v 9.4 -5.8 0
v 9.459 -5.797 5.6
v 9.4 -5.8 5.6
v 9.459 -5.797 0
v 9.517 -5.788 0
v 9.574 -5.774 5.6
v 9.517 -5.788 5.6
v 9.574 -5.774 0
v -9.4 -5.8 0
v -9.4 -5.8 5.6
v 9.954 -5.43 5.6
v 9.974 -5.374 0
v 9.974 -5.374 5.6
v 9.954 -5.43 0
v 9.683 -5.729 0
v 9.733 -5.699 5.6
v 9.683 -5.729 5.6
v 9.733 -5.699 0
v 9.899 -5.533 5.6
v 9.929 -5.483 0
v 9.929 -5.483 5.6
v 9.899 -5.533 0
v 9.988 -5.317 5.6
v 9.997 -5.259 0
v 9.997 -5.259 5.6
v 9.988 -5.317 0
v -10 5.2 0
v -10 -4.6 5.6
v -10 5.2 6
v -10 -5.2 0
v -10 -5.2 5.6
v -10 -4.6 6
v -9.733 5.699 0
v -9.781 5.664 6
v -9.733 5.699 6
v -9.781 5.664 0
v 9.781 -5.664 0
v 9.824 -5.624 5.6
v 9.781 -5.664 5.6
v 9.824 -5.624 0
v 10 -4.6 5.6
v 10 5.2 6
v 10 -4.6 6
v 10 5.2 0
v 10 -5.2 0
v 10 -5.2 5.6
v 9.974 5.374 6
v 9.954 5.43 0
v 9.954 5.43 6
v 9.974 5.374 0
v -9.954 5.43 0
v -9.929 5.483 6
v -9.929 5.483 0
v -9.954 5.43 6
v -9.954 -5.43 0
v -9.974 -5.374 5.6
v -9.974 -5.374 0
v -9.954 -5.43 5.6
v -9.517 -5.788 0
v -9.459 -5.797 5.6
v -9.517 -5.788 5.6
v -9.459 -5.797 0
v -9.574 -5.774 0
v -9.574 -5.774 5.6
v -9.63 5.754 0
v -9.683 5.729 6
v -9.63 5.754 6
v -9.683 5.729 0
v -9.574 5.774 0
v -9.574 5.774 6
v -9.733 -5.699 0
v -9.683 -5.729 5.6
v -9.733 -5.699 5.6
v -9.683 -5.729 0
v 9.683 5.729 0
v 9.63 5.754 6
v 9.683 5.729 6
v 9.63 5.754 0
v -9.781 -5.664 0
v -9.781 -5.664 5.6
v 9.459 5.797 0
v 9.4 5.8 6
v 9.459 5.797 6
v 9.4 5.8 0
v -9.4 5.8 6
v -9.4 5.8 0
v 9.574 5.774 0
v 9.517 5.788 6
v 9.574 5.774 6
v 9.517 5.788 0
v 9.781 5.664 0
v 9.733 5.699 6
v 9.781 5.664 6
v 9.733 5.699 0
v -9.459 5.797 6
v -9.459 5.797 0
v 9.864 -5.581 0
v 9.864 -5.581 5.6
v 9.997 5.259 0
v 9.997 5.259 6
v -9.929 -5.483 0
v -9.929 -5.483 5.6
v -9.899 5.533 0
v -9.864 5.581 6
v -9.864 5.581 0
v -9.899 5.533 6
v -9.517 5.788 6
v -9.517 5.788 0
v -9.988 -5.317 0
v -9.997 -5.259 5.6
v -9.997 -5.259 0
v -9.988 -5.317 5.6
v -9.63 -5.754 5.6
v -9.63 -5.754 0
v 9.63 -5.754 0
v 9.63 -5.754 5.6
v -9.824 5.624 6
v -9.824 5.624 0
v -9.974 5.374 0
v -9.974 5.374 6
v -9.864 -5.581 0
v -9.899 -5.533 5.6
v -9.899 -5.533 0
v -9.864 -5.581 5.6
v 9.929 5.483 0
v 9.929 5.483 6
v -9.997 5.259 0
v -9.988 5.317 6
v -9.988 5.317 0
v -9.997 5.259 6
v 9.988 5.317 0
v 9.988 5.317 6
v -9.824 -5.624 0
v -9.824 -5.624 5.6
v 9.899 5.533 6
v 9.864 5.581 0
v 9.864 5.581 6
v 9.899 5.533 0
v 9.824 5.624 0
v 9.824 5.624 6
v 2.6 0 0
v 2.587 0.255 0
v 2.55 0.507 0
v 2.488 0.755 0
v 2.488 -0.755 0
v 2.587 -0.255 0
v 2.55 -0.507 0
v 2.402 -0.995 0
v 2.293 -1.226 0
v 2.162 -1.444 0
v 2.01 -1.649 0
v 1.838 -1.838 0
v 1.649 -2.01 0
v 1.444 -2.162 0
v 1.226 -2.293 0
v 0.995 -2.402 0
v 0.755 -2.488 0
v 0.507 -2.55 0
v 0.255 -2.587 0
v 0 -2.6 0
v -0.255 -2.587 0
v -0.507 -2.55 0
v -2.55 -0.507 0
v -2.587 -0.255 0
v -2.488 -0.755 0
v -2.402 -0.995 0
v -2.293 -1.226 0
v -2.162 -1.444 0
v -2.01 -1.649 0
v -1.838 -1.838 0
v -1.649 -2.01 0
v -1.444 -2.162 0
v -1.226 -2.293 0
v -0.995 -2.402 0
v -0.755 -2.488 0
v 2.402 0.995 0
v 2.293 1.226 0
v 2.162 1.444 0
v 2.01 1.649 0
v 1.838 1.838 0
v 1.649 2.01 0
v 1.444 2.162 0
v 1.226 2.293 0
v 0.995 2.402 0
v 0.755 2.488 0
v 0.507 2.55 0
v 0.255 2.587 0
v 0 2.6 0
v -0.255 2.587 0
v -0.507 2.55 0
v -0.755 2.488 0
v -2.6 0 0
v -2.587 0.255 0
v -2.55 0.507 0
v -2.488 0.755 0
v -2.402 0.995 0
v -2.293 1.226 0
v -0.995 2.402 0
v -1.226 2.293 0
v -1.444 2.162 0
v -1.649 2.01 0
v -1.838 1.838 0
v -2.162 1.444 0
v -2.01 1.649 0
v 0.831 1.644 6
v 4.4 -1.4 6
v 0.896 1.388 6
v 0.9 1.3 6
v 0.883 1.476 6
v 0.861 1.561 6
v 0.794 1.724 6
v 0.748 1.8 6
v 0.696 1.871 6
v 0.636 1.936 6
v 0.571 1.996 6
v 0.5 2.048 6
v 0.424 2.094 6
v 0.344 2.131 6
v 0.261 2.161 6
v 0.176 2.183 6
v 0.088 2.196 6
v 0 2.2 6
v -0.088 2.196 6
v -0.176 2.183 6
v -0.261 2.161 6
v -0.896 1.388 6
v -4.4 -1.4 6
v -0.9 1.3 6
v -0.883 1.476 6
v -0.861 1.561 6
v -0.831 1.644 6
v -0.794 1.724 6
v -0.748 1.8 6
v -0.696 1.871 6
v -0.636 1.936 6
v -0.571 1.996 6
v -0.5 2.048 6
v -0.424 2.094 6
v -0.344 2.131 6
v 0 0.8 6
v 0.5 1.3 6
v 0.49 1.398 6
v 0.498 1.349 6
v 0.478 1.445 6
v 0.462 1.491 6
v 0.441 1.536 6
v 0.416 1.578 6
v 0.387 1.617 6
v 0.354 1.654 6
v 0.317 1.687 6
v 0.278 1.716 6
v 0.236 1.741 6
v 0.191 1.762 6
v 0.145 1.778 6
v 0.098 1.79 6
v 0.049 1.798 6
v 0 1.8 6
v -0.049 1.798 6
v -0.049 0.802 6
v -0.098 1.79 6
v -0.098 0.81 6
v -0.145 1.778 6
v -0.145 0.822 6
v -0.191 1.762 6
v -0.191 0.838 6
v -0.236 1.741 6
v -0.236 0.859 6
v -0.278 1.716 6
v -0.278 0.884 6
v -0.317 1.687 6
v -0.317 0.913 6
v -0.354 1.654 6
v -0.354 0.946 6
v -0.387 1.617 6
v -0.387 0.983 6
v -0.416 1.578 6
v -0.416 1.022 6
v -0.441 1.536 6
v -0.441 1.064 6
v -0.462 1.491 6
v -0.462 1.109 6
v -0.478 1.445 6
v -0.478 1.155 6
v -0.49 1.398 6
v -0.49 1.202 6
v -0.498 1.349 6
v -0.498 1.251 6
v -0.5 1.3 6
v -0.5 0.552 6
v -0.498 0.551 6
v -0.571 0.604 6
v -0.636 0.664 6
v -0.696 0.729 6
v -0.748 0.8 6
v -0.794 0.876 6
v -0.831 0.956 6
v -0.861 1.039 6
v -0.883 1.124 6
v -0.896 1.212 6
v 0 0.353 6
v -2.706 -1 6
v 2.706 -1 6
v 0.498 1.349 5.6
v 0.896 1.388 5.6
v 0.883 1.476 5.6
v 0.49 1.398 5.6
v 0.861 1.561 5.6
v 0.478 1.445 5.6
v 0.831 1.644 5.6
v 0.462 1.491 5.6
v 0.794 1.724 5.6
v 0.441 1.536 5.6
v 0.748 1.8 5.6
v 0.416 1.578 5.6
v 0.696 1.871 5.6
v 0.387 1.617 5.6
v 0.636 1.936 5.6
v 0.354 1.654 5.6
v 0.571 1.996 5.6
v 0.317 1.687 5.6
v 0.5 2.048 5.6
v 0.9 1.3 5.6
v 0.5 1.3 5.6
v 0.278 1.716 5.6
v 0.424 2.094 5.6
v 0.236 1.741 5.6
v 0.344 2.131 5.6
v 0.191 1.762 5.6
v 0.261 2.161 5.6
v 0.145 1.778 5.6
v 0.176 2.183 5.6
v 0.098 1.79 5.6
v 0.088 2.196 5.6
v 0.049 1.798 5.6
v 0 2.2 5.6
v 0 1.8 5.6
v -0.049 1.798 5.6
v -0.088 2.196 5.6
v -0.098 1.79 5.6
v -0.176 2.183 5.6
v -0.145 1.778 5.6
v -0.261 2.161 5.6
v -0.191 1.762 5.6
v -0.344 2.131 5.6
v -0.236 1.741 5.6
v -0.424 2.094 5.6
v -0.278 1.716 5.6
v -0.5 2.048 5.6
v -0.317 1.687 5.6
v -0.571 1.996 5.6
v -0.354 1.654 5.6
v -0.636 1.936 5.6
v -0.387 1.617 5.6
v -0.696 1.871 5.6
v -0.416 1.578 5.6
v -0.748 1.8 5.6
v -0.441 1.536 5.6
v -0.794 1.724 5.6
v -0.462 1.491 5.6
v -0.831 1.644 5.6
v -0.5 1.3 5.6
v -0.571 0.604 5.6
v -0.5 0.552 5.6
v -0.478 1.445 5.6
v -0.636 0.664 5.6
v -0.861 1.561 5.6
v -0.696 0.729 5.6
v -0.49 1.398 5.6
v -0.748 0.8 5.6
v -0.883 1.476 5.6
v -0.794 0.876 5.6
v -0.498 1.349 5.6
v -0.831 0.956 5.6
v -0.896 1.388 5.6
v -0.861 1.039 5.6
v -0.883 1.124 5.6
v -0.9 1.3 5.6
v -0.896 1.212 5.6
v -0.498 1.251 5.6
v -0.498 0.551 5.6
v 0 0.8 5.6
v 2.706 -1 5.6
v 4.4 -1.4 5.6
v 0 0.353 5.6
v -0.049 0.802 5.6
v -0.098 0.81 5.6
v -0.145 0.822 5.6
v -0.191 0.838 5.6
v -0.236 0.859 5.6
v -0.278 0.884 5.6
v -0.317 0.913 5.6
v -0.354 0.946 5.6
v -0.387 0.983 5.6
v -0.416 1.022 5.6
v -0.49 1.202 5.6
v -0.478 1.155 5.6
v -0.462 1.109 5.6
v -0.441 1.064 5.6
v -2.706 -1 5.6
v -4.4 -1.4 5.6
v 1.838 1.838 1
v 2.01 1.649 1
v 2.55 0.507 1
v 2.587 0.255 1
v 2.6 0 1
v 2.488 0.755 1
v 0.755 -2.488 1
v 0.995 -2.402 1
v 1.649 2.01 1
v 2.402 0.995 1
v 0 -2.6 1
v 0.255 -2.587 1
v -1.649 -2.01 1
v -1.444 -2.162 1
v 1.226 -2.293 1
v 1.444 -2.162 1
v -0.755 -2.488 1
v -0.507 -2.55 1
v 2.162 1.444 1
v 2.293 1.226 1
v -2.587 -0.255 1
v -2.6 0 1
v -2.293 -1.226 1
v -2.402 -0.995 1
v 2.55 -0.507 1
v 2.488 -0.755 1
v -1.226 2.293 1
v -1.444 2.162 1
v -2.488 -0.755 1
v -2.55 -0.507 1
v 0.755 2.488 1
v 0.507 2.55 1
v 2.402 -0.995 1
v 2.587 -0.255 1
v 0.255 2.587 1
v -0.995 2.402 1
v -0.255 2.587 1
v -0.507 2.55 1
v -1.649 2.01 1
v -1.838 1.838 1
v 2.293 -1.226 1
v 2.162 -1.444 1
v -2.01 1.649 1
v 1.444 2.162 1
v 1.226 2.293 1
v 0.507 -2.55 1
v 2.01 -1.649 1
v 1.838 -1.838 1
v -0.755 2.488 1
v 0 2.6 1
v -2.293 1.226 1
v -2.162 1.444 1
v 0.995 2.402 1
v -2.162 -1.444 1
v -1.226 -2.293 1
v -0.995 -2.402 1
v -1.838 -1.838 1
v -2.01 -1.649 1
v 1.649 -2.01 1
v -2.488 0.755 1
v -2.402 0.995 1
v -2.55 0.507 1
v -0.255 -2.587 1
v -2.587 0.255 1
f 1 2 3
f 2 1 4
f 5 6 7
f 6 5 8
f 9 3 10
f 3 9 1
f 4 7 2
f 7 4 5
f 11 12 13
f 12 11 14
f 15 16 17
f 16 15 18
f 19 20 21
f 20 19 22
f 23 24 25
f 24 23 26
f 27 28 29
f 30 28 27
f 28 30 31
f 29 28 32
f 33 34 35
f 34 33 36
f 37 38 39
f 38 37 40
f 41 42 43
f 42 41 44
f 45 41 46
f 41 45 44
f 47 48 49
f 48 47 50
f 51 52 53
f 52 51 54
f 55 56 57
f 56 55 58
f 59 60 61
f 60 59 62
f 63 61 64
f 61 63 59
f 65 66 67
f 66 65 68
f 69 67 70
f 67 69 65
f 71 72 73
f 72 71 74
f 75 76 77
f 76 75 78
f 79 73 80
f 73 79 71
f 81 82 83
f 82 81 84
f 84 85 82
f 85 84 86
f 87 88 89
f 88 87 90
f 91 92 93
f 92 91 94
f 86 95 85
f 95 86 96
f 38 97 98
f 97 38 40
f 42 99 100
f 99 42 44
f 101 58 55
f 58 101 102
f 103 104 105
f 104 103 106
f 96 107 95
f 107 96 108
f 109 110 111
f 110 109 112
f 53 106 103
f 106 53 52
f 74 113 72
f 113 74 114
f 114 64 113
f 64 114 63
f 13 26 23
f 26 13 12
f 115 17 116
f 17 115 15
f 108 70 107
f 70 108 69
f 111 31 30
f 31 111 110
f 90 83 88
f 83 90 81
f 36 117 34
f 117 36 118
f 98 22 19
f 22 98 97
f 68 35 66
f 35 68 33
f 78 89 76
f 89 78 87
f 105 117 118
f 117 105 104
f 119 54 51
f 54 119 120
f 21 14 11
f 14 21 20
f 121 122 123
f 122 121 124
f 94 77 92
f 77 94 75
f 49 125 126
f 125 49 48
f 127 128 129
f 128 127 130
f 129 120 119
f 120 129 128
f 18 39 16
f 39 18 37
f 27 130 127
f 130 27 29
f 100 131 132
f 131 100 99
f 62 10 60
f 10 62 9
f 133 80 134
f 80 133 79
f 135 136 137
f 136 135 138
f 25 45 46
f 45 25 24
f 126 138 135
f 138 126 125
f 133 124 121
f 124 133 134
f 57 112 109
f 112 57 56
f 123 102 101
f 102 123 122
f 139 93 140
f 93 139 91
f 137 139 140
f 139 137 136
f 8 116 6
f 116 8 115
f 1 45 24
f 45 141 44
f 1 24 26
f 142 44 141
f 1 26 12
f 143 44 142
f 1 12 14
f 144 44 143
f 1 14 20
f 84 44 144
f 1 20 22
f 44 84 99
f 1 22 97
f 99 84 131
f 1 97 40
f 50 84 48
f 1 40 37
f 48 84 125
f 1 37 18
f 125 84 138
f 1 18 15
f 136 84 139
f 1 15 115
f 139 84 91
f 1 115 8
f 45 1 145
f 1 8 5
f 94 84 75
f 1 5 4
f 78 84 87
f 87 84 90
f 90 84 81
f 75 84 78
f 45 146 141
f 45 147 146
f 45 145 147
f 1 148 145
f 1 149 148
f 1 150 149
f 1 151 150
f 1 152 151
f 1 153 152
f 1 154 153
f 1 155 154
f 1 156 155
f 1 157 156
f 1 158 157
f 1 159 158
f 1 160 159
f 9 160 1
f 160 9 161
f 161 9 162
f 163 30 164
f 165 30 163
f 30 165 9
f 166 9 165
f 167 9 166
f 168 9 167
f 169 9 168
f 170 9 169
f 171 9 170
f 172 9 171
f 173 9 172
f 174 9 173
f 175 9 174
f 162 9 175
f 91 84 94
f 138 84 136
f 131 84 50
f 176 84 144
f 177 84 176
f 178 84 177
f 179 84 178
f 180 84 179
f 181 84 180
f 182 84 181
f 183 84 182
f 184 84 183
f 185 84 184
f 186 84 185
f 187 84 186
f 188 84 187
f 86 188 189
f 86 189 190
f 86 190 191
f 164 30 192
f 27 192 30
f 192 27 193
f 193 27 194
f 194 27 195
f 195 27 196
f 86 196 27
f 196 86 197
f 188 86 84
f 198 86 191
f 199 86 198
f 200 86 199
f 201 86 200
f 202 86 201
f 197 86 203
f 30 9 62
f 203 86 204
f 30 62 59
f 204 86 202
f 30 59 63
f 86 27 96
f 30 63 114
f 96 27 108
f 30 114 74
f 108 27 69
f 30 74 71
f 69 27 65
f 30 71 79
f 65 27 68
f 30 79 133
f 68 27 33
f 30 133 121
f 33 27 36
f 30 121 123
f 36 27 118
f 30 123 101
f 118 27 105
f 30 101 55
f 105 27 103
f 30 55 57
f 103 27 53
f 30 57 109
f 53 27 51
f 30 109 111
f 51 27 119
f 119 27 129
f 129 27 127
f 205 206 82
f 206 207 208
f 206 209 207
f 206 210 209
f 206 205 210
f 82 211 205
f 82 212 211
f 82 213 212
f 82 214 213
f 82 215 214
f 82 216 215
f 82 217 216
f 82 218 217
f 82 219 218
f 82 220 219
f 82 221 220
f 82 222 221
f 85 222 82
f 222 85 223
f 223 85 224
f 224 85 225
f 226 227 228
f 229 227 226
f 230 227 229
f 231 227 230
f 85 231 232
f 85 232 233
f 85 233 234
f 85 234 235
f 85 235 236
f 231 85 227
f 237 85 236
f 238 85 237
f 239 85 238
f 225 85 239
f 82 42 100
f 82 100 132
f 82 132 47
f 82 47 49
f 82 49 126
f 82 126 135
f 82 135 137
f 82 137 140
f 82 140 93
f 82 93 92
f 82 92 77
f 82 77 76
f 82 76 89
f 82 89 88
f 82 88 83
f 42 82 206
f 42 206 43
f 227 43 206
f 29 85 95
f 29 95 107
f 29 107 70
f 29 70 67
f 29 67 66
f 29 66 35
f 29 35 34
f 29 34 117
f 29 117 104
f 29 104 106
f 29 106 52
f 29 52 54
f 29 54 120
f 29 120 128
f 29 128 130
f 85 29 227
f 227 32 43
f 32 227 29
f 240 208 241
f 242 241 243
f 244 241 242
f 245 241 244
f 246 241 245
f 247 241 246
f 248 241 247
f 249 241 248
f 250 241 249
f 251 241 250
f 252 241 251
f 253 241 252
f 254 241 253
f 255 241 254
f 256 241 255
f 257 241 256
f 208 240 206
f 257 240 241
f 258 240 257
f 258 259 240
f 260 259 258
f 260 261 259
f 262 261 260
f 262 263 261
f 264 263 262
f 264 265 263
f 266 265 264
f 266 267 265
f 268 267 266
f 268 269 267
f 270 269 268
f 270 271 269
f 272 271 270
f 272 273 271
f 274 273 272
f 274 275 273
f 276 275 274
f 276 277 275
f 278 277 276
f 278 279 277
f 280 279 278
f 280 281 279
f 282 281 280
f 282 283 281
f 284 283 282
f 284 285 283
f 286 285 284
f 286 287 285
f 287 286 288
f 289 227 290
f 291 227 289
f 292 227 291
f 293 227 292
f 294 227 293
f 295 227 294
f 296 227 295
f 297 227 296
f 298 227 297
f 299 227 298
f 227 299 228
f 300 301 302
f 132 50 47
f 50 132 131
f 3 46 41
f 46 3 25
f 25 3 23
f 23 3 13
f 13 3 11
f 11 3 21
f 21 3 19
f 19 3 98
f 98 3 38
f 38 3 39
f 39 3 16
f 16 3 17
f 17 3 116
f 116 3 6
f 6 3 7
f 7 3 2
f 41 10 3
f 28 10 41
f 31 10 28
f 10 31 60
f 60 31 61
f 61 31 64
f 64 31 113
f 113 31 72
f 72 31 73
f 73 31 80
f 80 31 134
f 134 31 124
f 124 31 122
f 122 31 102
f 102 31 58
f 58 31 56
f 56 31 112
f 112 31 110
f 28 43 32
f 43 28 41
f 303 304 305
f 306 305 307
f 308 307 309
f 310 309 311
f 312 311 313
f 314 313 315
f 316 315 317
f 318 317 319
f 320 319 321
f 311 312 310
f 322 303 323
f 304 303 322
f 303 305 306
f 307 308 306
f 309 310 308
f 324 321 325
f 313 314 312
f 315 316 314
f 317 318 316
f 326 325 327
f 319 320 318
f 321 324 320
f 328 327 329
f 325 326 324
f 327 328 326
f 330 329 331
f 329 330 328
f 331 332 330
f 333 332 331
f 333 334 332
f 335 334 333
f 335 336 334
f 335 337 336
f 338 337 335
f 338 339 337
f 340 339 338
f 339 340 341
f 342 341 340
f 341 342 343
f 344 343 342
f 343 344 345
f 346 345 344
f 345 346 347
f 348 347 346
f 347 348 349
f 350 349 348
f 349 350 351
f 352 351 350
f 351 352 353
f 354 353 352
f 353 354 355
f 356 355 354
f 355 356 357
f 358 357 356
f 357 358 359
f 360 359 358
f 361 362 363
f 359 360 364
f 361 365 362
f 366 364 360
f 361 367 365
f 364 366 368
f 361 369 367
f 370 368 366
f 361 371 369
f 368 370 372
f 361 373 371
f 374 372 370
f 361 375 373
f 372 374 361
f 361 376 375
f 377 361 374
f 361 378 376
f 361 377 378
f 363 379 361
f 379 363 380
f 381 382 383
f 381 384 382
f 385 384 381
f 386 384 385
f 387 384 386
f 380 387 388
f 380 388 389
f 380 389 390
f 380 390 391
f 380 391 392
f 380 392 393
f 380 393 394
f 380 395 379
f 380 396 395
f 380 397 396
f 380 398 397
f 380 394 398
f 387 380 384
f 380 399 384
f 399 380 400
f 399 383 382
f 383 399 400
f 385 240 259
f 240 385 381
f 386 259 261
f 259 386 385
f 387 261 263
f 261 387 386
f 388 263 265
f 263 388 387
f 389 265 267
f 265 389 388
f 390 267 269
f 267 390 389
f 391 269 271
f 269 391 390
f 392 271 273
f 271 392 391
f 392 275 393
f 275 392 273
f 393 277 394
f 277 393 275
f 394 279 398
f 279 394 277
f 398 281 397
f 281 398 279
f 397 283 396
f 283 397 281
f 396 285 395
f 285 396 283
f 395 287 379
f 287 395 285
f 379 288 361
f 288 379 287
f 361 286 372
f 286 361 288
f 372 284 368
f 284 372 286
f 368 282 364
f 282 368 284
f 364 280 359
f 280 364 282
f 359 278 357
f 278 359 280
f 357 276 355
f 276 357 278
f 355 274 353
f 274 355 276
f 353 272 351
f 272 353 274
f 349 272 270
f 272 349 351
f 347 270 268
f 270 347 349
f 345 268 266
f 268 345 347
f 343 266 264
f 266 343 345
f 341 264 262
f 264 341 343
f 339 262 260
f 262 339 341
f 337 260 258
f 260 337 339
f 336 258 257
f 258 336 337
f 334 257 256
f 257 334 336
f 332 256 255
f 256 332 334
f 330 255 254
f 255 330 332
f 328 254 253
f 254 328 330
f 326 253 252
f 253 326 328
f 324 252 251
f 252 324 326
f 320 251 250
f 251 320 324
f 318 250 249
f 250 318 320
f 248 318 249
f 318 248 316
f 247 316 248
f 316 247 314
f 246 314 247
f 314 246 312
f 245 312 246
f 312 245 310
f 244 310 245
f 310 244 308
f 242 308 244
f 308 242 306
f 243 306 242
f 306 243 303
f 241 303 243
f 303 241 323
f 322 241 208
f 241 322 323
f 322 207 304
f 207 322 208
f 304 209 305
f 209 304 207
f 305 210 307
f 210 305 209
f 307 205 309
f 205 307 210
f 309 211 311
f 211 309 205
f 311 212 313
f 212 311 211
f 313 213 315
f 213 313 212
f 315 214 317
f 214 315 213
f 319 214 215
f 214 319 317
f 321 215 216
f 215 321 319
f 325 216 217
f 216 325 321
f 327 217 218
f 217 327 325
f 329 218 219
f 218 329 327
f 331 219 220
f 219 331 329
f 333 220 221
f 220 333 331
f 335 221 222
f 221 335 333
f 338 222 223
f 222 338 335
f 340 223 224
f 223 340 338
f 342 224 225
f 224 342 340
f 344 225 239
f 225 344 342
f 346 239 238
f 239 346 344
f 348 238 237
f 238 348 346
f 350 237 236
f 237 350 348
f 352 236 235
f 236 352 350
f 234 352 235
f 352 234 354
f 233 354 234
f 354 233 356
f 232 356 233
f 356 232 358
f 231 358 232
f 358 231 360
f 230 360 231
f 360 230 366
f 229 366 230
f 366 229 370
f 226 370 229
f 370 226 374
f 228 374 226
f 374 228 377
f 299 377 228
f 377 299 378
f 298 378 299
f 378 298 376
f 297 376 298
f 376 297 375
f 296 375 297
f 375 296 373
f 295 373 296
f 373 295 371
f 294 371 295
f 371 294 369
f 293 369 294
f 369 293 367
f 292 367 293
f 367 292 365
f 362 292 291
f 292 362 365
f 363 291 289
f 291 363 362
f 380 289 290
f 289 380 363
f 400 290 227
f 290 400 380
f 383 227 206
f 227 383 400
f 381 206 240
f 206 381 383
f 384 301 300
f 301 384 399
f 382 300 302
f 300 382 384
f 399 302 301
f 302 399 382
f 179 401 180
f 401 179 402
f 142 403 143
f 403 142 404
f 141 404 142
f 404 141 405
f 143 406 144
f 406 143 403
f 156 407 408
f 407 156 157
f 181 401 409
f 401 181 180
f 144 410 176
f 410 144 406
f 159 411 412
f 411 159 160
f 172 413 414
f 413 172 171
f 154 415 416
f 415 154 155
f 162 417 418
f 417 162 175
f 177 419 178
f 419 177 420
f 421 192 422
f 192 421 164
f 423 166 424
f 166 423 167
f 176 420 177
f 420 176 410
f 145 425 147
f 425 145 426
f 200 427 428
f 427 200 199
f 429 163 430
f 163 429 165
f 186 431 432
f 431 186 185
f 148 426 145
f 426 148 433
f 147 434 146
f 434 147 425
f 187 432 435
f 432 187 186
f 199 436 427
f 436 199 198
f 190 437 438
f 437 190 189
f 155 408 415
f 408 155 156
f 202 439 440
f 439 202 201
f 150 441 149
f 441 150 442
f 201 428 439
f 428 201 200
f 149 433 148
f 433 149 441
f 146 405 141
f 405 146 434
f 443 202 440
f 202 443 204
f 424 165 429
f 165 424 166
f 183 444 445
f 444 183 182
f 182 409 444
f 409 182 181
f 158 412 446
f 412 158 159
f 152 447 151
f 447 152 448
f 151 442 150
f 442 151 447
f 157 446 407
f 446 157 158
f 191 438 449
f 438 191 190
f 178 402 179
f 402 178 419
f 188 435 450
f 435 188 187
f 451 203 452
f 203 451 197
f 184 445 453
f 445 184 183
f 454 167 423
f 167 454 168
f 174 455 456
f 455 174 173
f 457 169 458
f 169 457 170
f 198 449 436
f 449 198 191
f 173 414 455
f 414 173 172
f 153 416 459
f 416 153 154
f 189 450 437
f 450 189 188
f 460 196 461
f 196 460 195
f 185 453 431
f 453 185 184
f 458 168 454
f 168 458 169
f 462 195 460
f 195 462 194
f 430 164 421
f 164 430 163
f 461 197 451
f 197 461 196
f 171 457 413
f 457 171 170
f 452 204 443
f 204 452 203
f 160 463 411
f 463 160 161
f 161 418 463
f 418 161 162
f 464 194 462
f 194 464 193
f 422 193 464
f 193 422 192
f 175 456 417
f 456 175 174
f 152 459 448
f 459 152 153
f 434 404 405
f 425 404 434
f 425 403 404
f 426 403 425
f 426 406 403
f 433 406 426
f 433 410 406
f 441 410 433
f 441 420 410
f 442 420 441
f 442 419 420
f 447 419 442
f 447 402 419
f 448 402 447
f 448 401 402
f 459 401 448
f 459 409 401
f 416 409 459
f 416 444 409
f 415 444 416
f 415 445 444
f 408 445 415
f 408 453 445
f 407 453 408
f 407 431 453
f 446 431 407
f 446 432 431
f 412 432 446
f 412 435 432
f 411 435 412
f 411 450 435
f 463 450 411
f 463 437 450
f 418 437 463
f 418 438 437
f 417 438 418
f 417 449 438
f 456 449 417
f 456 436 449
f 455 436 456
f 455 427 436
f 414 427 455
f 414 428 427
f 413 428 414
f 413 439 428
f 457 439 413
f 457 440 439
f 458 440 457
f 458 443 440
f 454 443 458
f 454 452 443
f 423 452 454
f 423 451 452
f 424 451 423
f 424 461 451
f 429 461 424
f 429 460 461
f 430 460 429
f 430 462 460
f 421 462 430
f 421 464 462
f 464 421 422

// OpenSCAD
// file: ../lib/common.scad
// open-room-planner — shared helpers for every part.
//
// Parts are modelled in REAL-WORLD dimensions (centimetres) and shrunk to the
// plan scale on the way out, so a .scad reads like a furniture spec sheet:
// a 160x200 bed is written as 160 x 200, not 32 x 40.
//
// Scale matches the paper plans (base.svg): 1:50, i.e. 2 cm on the plan = 1 m.

// 1:Scale — override from the Makefile / command line with -D Scale=25.
Scale = 50;

// $fn for the final render. The CLI is never in $preview, so this is the real one.
Resolution = 64;

// Engraved-label defaults (see label()).
Label_size  = 3;    // printed cap height, mm
Label_depth = 0.4;  // how deep the text is cut into the top face, mm

// Engraved-symbol defaults, for pieces that carry a pictogram instead of text
// (see hanger()). Printed mm — drawing detail, so they do not scale.
Symbol_size   = 4;    // nominal symbol height, shrunk to what the piece allows
Symbol_stroke = 0.4;  // line width of a symbol — keep it >= one nozzle
Symbol_margin = 0.8;  // min wall between a symbol and the edge of a piece
Hanger_ratio  = 2.2;  // width : height of the hanger symbol

// Corner rounding of a footprint, in printed mm (not scaled — it is a print
// detail, not a real-world dimension).
Corner_radius = 0.6;

// Magnet pockets, in printed mm — hardware, not a real-world dimension, so they
// stay the same at any scale. The pocket opens at the BOTTOM face so the magnet
// touches the steel directly (no plastic in the gap: a 0.4 mm layer over a small
// disc costs half its pull) and needs no bridging — drop it in after printing.
// 5x1 discs pull ~130 g each and only eat 1 mm of a 6 mm piece; 3x2 fits the
// small tokens. Keep every magnet the same way up so neighbouring pieces repel
// gently instead of snapping together and skewing the layout.
Magnet_d     = 5;    // magnet diameter
Magnet_h     = 1;    // magnet height = pocket depth (magnet sits flush)
Magnet_fit   = 0.2;  // added to the diameter for a press fit
Magnet_inset = 1.2;  // min wall between a pocket and the outside of a piece
Magnet_gap   = 1.5;  // min wall between two pockets
Magnet_spread = 0.8; // how much of the usable span multiple pockets use, 0..1

$fn = Resolution;

// ---- unit conversion --------------------------------------------------------
// real-world centimetres -> printed millimetres
function cm(v) = v * 10 / Scale;
// real-world millimetres -> printed millimetres
function mm(v) = v / Scale;

// ---- building blocks --------------------------------------------------------

// The base shape of every piece: a <w_cm> x <d_cm> block, <h> mm tall (printed
// height, chosen for handling — not the scaled real height), centred on the
// origin with rounded corners.
module footprint(w_cm, d_cm, h, r = Corner_radius) {
    linear_extrude(height = h)
        offset(r = r) offset(delta = -r)
            square([cm(w_cm), cm(d_cm)], center = true);
}

// A 2D footprint outline only — for laser-cut / plan output.
module footprint_2d(w_cm, d_cm, r = Corner_radius) {
    offset(r = r) offset(delta = -r)
        square([cm(w_cm), cm(d_cm)], center = true);
}

// Text cut into the top face of a piece. Subtract it from the solid:
//   difference() { footprint(160, 200, 6); label("160x200", 6); }
module label(txt, top_z, size = Label_size, depth = Label_depth) {
    translate([0, 0, top_z - depth])
        linear_extrude(height = depth + 0.01)
            text(txt, size = size, halign = "center", valign = "center",
                 font = "DejaVu Sans");
}

// ---- symbols ----------------------------------------------------------------
// The tallest hanger that fits a <w> x <h> printed-mm patch of top face, so a
// small piece gets the same symbol as a big one, just smaller.
function hanger_size(w, h, size = Symbol_size, ratio = Hanger_ratio) =
    min(size, h, w / ratio);

// A clothes hanger cut into the top face of a piece — a triangular body under a
// hooked loop, drawn in <stroke>-wide lines, <size> mm tall and <ratio> x that
// wide, centred on the origin. Subtract it from the solid like label():
//   difference() { footprint(100, 58, 6); hanger(4, 6); }
module hanger(size, top_z, stroke = Symbol_stroke, depth = Label_depth,
              ratio = Hanger_ratio) {
    w      = size * ratio;
    hook_d = size * 0.45;      // the loop takes the top of the symbol
    hook_r = hook_d / 2;
    body_h = size - hook_d;    // ... the shoulders the rest
    body   = [[-w / 2, 0], [w / 2, 0], [0, body_h]];
    // the loop sits <stroke> into the apex so body and hook come out as one cut
    cy     = body_h + hook_r - stroke;
    translate([0, 0, top_z - depth])
        linear_extrude(height = depth + 0.01)
            translate([0, -size / 2])
                union() {
                    difference() {          // shoulders + bottom bar
                        polygon(body);
                        offset(delta = -stroke) polygon(body);
                    }
                    difference() {          // hook, open at the lower right
                        translate([0, cy]) difference() {
                            circle(d = hook_d);
                            circle(d = hook_d - 2 * stroke);
                        }
                        translate([0, cy - hook_r]) square([hook_r, hook_r]);
                    }
                }
}

// ---- magnets ----------------------------------------------------------------
// How many magnet pockets of <n> requested actually fit in a <w_cm> x <d_cm>
// footprint: they sit in a row on the longer axis, keep <inset> of wall to the
// outside and <gap> of wall to each other. 0 = the piece is too small for one.
function magnet_count(w_cm, d_cm, n = 1, d = Magnet_d, fit = Magnet_fit,
                      inset = Magnet_inset, gap = Magnet_gap) =
    let (od    = d + fit,
         short = min(cm(w_cm), cm(d_cm)),
         span  = max(cm(w_cm), cm(d_cm)) - 2 * inset - od)
    (short < od + 2 * inset || span < 0) ? 0
                                        : min(n, floor(span / (od + gap)) + 1);

// A single pocket in the bottom face, at <x>,<y> printed mm from the centre of
// the piece (unlike groove(), which takes real-world cm — a magnet is hardware).
module magnet_pocket(x = 0, y = 0, d = Magnet_d, h = Magnet_h, fit = Magnet_fit) {
    translate([x, y, -0.01])
        cylinder(h = h + 0.01, d = d + fit);
}

// <n> pockets spread along the longer axis of a <w_cm> x <d_cm> footprint,
// centred on the piece. Subtract it from the solid:
//   difference() { footprint(160, 200, 6); magnets(160, 200, 2); }
// The count is clamped to what fits; a piece too small for even one is left
// solid with a warning, so the same call is safe at any scale.
module magnets(w_cm, d_cm, n = 1, d = Magnet_d, h = Magnet_h, fit = Magnet_fit,
               inset = Magnet_inset, gap = Magnet_gap, spread = Magnet_spread) {
    count = magnet_count(w_cm, d_cm, n, d, fit, inset, gap);
    if (count < n)
        echo(str("WARNING: ", w_cm, "x", d_cm, " cm at 1:", Scale, " fits ",
                 count, " of ", n, " ", d, "x", h, " mm magnets"));
    if (count > 0) {
        along_x = cm(w_cm) > cm(d_cm);
        // centre-to-centre room, shrunk so the row does not hug the ends
        span = (max(cm(w_cm), cm(d_cm)) - 2 * inset - (d + fit)) * spread;
        step = count > 1 ? span / (count - 1) : 0;
        for (i = [0 : count - 1]) {
            p = count > 1 ? -span / 2 + i * step : 0;
            magnet_pocket(along_x ? p : 0, along_x ? 0 : p, d, h, fit);
        }
    }
}

// A shallow groove on the top face, used to hint at fronts, doors and drawers.
// Coordinates are real-world cm, measured from the centre of the piece.
module groove(x_cm, y_cm, w_cm, d_cm, top_z, depth = Label_depth) {
    translate([cm(x_cm), cm(y_cm), top_z - depth])
        linear_extrude(height = depth + 0.01)
            square([cm(w_cm), cm(d_cm)], center = true);
}
// main file
// bedroom / pax — an IKEA PAX wardrobe frame token, with a hanger engraved on top
// and a groove marking the door front. The size is in the file name; a 50 cm-wide
// frame is only 10 mm across at 1:50, too narrow for a readable one.
//
// Width/Depth are the real-world frame size in cm (PAX comes 50, 75 or 100 wide,
// 58 or 35 deep). Height is the PRINTED height in mm: kept the same as the beds
// (6 mm) so every piece of the set stacks and slides on the plan.
//
// The back sits against the wall at +Y — same orientation as a bed's head end —
// so the doors are marked at the -Y edge.

include <../lib/common.scad>

Width  = 100;  // cm
Depth  = 58;   // cm
Height = 6;    // printed height, mm

Show_hanger = true;
// Door slab marked along the front edge, in real-world cm.
Front_depth = 6;
// Magnet pockets in the bottom face (0 = none). A 35 cm-deep frame is only 7 mm
// across at 1:50 — too narrow for a 5 mm disc, so it comes out solid unless you
// build with smaller hardware (MAGNET_D=3 MAGNET_H=2).
Magnets = 1;

pax();

module pax() {
    // what the hanger has to fit in: the top face, minus the door groove
    free_w = cm(Width) - 2 * Symbol_margin;
    free_d = cm(Depth) - cm(Front_depth) - 2 * Symbol_margin;
    difference() {
        footprint(Width, Depth, Height);
        // doors, marked at the -Y front
        groove(0, -(Depth / 2 - Front_depth / 2), Width, Front_depth, Height);
        // hanger centred on what is left of the top face above the door groove
        if (Show_hanger)
            translate([0, cm(Front_depth) / 2, 0])
                hanger(hanger_size(free_w, free_d), Height);
        if (Magnets > 0)
            magnets(Width, Depth, Magnets);
    }
}
